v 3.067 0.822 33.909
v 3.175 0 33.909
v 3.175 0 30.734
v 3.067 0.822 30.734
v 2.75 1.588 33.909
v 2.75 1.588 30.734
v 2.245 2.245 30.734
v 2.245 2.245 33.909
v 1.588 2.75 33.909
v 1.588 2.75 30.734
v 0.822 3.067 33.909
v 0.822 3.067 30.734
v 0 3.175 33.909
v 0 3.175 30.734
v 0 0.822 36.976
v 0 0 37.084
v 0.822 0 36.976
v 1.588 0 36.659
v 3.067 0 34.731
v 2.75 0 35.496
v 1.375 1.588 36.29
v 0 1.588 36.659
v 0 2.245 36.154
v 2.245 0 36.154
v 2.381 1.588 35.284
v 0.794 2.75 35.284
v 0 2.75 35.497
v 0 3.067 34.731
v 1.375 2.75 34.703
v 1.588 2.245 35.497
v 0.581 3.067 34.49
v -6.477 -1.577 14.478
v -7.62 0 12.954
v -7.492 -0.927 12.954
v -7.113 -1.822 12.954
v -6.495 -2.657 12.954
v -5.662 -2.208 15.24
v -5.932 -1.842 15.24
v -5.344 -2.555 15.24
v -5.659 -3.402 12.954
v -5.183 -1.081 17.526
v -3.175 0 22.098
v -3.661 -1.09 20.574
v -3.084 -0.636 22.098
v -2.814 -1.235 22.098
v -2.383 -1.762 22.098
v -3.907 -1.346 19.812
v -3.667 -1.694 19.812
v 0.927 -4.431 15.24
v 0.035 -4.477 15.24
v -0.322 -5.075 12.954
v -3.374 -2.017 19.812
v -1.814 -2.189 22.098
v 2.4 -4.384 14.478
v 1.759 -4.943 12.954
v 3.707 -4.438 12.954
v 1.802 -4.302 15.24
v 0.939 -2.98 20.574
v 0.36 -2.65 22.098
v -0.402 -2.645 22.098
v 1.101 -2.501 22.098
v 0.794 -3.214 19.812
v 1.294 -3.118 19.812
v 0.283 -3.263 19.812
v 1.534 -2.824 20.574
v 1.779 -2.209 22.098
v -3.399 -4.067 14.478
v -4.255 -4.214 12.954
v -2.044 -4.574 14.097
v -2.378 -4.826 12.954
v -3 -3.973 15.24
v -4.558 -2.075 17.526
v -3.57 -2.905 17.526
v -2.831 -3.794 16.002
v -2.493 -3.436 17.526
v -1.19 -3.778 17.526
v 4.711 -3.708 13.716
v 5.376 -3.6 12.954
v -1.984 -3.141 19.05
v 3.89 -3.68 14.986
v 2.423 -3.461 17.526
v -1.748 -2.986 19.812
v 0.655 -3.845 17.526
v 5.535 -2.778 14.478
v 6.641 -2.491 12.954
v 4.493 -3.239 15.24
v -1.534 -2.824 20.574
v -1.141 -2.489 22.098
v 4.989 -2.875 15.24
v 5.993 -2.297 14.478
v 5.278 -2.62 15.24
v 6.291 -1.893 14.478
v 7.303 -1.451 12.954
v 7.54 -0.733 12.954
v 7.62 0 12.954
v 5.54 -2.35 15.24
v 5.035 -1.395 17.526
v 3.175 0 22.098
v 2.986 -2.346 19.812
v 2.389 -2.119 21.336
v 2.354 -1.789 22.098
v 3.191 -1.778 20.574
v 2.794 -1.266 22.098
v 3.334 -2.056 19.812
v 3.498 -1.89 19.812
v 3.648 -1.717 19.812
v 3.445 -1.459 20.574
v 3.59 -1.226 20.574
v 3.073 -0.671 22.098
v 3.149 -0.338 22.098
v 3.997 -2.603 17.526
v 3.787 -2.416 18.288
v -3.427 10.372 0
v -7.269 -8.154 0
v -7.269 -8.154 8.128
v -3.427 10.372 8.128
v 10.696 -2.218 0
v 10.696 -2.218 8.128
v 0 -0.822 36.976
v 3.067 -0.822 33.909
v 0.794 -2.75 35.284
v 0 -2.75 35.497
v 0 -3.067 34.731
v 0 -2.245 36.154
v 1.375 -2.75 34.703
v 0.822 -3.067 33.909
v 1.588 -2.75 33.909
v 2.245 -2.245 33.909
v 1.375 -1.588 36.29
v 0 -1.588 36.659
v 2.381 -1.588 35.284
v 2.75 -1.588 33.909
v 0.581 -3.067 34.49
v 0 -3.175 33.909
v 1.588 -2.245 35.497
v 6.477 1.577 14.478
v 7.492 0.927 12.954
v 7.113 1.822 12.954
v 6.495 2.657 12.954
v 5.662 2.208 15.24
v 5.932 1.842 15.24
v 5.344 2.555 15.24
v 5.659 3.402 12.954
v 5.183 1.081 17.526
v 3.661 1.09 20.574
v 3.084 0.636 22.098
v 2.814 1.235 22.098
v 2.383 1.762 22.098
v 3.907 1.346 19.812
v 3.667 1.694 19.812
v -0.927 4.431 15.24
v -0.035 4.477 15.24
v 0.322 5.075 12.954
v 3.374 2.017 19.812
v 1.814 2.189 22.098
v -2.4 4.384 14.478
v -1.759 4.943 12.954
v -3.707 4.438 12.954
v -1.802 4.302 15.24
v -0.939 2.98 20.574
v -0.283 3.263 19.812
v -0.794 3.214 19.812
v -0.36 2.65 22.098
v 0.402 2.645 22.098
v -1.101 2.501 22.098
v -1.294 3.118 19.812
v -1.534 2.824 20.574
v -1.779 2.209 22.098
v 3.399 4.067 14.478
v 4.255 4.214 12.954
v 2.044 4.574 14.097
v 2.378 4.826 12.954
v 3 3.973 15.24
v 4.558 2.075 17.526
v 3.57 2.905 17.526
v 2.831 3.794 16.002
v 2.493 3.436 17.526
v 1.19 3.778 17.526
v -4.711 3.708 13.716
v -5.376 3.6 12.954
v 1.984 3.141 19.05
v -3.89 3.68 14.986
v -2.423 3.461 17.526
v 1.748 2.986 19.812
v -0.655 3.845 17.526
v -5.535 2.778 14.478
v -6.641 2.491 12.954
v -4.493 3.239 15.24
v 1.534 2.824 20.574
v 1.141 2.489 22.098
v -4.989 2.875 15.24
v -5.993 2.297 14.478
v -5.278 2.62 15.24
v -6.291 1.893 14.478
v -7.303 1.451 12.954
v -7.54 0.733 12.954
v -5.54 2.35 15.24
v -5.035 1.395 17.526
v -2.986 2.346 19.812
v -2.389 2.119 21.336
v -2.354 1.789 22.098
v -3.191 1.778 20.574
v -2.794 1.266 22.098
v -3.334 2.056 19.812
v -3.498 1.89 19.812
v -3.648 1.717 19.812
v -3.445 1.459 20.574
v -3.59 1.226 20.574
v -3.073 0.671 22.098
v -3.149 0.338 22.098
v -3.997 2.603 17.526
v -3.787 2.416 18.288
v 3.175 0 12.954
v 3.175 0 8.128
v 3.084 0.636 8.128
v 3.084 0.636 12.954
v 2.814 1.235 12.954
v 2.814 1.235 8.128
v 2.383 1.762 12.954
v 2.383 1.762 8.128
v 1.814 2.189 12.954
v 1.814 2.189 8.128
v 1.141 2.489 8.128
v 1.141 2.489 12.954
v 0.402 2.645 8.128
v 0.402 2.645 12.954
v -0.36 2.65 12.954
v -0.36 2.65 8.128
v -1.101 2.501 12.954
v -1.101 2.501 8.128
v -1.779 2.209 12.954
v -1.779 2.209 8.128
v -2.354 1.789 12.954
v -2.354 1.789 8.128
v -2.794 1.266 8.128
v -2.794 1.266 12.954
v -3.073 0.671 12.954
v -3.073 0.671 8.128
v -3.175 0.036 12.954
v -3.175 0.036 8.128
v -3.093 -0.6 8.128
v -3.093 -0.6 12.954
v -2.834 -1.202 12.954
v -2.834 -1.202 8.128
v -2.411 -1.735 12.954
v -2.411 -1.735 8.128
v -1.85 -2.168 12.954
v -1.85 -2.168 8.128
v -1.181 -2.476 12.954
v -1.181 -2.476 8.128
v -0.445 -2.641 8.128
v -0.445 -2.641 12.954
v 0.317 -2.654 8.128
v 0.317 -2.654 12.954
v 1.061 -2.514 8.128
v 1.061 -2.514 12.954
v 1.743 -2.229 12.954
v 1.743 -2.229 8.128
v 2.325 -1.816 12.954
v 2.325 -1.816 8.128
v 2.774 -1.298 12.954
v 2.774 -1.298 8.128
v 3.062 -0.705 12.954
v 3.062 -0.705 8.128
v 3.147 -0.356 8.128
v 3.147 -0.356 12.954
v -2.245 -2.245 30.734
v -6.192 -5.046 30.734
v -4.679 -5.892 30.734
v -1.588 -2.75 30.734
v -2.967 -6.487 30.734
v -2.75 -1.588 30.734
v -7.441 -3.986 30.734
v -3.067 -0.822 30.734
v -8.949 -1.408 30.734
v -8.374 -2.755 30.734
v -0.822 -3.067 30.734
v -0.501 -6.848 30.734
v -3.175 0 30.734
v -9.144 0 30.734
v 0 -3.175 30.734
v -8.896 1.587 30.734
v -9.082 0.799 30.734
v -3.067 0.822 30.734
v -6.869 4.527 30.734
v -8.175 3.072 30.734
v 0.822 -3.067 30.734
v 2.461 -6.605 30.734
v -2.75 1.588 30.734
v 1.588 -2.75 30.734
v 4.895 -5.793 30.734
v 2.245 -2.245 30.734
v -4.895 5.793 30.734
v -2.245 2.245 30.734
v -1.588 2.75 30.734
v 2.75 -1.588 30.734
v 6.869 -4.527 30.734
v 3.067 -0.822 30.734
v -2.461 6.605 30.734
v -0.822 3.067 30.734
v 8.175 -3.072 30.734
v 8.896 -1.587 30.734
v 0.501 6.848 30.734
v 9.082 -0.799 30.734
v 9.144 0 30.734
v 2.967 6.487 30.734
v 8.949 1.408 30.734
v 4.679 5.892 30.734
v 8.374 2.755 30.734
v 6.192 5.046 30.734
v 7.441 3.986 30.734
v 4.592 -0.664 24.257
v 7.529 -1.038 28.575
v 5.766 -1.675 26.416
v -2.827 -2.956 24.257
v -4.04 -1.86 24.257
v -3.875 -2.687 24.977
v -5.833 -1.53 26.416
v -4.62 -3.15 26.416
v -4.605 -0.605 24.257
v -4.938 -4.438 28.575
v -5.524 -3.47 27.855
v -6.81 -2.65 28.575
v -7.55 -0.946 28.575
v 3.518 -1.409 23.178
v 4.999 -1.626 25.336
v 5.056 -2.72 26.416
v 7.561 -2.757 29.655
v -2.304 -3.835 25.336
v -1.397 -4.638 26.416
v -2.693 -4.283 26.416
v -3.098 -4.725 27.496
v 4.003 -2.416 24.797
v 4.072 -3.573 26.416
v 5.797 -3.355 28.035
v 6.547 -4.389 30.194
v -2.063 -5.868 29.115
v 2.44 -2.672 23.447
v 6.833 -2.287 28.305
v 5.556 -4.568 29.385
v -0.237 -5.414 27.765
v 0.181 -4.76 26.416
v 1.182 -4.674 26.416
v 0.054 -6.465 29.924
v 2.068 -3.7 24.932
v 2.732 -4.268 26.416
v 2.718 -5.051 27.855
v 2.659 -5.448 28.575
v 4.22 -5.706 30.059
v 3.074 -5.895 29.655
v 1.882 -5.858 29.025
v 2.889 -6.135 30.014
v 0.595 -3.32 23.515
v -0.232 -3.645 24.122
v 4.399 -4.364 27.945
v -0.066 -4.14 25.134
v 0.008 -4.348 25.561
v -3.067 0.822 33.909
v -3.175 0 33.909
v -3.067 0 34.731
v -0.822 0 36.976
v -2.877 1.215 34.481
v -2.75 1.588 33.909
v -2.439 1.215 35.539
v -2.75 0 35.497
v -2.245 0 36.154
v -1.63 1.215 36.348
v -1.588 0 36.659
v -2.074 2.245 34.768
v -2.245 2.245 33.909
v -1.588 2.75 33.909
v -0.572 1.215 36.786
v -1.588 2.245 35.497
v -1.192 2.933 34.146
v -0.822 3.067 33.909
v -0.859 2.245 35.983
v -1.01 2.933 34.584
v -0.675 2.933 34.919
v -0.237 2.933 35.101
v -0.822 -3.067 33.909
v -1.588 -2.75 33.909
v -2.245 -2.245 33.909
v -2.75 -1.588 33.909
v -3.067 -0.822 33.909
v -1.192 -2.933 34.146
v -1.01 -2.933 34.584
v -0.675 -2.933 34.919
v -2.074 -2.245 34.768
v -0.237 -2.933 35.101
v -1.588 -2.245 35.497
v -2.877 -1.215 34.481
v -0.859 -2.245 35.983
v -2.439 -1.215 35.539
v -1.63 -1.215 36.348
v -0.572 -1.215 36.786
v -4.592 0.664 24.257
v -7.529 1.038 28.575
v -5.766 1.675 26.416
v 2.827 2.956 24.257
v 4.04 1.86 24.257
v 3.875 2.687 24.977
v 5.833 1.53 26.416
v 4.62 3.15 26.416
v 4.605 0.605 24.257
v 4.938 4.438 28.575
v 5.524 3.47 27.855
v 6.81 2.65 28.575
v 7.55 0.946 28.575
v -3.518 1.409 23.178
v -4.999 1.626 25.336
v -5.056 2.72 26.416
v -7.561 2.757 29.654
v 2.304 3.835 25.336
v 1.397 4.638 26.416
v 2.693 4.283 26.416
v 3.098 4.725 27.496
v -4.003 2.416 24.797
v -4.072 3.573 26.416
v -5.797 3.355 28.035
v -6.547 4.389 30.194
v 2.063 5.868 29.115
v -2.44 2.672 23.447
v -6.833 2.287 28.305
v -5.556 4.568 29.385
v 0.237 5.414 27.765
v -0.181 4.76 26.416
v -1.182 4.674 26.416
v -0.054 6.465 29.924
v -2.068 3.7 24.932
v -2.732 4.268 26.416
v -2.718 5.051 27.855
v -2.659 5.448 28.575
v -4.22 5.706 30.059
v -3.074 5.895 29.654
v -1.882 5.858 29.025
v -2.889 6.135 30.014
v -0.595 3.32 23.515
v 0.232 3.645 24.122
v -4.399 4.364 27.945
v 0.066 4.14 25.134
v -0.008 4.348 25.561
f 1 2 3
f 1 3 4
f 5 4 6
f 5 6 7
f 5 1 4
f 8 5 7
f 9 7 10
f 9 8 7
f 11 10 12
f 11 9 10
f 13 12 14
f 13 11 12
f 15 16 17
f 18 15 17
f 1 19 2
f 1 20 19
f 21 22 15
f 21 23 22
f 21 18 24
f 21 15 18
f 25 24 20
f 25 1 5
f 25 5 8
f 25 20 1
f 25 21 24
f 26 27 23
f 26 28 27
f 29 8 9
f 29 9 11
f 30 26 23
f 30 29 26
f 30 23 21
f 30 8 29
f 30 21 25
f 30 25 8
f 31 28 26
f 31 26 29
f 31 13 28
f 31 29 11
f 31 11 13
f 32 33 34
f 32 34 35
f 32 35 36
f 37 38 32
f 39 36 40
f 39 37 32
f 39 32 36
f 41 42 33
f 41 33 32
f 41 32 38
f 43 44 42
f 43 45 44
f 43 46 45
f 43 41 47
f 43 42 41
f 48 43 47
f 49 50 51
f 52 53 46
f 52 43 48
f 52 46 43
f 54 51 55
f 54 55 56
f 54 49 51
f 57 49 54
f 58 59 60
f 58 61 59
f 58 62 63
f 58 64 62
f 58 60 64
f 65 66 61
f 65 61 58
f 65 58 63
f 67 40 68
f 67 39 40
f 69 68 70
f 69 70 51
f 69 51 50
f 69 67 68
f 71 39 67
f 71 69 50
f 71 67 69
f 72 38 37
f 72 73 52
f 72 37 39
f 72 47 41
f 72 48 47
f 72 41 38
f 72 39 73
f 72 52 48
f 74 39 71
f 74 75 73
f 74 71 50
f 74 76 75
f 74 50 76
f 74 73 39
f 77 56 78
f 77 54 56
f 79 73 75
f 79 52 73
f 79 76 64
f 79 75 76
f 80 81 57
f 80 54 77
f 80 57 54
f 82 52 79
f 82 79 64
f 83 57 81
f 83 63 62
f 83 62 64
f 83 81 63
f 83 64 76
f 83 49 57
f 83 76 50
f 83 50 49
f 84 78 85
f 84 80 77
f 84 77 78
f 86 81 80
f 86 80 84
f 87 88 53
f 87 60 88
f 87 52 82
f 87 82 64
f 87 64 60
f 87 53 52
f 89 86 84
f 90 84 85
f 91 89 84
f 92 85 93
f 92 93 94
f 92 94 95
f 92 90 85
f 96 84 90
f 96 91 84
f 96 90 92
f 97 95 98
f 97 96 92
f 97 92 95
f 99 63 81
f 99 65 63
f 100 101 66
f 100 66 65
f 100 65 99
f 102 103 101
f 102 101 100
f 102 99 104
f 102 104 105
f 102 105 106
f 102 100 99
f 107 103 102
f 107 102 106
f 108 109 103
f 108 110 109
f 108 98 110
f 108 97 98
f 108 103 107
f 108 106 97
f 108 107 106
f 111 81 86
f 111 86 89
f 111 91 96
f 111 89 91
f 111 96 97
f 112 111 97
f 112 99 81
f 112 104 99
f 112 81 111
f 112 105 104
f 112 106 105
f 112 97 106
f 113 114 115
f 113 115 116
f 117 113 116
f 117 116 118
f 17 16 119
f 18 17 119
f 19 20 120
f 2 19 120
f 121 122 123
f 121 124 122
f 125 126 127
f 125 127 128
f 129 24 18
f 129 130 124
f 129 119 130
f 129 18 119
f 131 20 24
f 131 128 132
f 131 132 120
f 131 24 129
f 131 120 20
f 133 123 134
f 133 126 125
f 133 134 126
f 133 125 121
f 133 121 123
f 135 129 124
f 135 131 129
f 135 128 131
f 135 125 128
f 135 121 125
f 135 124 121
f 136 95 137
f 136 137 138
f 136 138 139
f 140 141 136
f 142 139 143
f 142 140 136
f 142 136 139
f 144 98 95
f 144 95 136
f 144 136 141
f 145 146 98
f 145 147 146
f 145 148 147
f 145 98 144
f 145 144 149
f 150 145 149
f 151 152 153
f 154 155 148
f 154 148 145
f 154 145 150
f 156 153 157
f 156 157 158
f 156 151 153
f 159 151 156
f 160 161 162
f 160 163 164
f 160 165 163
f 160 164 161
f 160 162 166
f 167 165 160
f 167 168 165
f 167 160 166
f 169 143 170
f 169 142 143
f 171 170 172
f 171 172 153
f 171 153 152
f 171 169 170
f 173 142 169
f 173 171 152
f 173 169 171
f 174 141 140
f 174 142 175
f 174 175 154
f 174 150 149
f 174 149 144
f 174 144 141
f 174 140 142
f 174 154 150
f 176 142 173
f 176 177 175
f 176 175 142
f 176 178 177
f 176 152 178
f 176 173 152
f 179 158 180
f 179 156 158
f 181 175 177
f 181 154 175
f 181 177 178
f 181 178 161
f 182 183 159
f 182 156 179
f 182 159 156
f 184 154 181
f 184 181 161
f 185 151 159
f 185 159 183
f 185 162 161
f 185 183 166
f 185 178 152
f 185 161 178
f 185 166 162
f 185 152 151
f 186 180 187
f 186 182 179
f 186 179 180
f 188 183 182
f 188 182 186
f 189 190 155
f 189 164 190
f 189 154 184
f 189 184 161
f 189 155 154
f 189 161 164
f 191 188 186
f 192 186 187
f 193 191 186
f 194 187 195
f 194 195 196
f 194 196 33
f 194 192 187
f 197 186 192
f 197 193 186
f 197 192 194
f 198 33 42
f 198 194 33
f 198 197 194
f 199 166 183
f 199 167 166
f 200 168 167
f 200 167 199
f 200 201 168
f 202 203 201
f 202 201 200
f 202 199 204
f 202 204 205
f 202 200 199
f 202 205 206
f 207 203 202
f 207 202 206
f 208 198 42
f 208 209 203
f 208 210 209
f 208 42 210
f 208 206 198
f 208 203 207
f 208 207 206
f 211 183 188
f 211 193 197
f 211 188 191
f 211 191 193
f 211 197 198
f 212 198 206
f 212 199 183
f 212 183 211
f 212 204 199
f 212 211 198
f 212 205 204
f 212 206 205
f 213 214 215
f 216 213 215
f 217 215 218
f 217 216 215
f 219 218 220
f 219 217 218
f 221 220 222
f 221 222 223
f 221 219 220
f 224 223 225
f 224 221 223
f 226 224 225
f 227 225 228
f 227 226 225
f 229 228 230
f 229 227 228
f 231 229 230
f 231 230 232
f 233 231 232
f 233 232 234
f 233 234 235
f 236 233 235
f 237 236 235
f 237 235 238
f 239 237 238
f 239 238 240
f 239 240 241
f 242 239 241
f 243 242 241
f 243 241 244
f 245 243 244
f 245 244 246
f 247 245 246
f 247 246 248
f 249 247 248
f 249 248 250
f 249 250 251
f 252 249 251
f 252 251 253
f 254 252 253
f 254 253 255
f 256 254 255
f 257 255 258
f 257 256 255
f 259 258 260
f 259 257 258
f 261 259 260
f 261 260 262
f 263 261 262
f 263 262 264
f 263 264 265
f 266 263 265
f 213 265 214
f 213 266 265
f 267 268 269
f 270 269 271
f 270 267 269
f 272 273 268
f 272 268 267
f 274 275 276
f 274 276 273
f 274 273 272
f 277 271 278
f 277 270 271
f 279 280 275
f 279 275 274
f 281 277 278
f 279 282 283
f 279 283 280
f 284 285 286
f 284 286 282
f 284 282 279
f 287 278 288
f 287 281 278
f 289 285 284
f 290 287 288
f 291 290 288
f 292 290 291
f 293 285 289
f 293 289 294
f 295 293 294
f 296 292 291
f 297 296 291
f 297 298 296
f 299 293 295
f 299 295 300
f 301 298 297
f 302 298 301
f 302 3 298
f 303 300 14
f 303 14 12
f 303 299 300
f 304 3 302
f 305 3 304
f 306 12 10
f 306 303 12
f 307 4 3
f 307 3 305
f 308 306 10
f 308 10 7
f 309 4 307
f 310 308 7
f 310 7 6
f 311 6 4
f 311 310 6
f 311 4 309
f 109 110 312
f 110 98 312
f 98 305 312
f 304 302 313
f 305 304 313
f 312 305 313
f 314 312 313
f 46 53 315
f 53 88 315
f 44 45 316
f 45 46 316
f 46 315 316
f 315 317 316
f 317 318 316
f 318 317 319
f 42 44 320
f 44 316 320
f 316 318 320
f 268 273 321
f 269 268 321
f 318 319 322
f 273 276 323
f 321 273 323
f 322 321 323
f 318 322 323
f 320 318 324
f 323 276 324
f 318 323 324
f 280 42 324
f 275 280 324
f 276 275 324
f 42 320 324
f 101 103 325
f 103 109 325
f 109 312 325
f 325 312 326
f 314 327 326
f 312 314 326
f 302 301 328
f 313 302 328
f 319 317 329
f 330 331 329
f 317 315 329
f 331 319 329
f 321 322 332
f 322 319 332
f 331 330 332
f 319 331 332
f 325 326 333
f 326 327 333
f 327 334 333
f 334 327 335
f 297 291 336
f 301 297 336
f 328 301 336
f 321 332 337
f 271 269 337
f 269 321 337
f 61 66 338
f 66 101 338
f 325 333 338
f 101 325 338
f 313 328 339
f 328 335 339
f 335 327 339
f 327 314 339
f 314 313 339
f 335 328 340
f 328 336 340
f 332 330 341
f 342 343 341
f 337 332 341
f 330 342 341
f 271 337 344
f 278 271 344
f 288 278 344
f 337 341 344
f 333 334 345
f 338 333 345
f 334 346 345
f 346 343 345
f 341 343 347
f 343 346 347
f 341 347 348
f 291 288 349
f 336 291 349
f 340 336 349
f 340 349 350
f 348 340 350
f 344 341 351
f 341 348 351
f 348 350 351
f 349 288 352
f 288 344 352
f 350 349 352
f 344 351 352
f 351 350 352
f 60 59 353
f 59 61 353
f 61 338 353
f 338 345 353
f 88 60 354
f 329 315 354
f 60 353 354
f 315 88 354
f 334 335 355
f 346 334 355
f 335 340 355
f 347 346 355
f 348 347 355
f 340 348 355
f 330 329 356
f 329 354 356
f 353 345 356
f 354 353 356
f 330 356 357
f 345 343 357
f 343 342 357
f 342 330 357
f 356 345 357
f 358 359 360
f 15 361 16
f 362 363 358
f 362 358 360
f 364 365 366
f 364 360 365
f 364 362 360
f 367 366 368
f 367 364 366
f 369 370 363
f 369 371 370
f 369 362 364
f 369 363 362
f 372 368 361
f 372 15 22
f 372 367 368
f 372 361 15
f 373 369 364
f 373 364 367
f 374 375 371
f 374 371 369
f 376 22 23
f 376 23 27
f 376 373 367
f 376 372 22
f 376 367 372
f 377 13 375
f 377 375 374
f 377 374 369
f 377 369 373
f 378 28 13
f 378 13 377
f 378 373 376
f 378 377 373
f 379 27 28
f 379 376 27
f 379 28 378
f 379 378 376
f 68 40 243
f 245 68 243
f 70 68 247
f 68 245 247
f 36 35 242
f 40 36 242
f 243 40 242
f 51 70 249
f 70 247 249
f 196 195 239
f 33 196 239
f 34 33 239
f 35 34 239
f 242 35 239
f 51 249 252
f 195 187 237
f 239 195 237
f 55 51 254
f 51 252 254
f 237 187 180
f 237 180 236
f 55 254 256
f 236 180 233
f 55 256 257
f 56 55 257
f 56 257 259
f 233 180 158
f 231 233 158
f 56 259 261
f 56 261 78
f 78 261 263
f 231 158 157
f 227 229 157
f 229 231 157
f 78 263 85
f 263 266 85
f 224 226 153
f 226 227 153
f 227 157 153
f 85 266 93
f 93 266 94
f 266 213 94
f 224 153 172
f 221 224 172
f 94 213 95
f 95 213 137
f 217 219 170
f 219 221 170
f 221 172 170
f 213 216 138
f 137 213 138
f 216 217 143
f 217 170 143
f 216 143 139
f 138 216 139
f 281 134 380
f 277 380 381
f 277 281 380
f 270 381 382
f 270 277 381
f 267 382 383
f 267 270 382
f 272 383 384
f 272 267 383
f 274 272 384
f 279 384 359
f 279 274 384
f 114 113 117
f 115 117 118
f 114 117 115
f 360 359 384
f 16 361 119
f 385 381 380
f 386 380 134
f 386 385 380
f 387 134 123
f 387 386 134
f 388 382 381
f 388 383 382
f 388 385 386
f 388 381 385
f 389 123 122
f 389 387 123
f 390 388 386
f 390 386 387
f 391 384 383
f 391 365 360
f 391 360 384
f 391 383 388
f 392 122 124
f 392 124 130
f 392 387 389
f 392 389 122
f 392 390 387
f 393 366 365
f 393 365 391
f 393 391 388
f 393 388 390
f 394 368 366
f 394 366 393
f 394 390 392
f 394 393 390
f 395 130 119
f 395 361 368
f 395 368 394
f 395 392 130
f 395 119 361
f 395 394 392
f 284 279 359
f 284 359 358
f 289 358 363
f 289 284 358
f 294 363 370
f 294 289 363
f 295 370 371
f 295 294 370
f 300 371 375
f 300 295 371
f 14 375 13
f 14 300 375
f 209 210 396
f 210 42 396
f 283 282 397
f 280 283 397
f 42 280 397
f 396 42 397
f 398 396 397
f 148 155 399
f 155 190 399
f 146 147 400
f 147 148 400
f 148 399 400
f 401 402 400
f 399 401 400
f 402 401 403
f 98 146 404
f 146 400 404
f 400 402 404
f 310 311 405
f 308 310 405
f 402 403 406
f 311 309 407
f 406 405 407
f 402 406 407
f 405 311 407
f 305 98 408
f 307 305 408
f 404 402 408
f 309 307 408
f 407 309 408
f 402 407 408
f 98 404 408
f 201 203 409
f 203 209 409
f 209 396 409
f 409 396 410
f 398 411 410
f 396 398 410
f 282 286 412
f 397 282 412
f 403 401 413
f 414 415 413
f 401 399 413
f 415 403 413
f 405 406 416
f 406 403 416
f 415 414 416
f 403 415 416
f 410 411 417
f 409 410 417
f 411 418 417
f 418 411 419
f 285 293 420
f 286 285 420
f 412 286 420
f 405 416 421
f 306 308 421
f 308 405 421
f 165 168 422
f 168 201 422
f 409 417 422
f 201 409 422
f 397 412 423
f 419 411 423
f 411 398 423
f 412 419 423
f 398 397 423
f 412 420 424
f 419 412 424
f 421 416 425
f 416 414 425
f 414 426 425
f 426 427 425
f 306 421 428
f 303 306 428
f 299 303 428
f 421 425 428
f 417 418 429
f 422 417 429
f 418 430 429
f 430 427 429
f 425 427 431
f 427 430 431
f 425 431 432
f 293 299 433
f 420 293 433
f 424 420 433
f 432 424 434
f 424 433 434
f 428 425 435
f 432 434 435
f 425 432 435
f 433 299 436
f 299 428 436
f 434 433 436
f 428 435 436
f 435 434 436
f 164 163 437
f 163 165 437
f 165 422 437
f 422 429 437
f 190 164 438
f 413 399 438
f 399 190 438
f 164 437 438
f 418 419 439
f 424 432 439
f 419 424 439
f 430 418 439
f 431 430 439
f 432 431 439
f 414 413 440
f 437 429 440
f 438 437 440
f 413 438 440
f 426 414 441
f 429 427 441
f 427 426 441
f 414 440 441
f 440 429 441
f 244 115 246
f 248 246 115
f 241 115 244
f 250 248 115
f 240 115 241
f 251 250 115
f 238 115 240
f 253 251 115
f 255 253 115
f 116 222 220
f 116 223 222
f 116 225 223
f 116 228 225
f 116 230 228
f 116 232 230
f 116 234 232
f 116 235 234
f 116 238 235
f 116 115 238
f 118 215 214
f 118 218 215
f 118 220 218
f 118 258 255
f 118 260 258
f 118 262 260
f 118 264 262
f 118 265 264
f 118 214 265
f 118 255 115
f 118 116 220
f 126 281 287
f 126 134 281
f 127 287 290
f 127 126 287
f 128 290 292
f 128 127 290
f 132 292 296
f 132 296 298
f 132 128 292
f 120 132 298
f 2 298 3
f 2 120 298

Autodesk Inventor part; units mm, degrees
ref_plane "YZ Plane" through (0, 0, 0) normal (1, 0, 0) x (0, 1, 0)
ref_plane "XZ Plane" through (0, 0, 0) normal (0, 1, 0) x (-1, 0, 0)
ref_plane "XY Plane" through (0, 0, 0) normal (0, 0, 1) x (1, 0, 0)
sketch "Sketch1" plane through (0, 0, 0) normal (0, 0, 1) x (1, 0, 0)
  line L0 (-3.4267, 10.372) -> (10.6957, -2.2184)
  line L1 (10.6957, -2.2184) -> (-7.2691, -8.1536)
  line L2 (-7.2691, -8.1536) -> (-3.4267, 10.372)
  ellipse E0 centre (0, 0) end of major axis (3.175, 0) minor radius 2.667
  dimension "d1" = 3.175
  dimension "d2" = 2.667
  dimension "d0" = 14.1224
extrude "Extrusion1" add sketch "Sketch1" along normal blind 8.128 contours L0 L1 L2 | E0
ref_plane "Work Plane2" through (0, 0, 12.954) normal (0, 0, 1) x (1, 0, 0)
sketch "Sketch2" plane through (0, 0, 12.954) normal (0, 0, 1) x (1, 0, 0)
  point P0 (0, 0)
sketch "Sketch3" plane through (0, 0, 12.954) normal (0, 0, 1) x (1, 0, 0)
  point P0 (0, 0)
sketch "Sketch4" plane through (0, 0, 12.954) normal (0, 0, 1) x (1, 0, 0)
  ellipse E0 centre (0, 0) end of major axis (3.175, 0) minor radius 2.667
  dimension "d6" = 3.175
  dimension "d7" = 2.667
sketch "Sketch5" plane through (0, 0, 12.954) normal (0, 0, 1) x (1, 0, 0)
  line L0 (10.6957, -2.2184) -> (-3.4267, 10.372) projected
  line L1 (-3.4267, 10.372) -> (-7.2691, -8.1536) projected
  line L2 (-7.2691, -8.1536) -> (10.6957, -2.2184) projected
sketch "Sketch6" plane through (0, 0, 8.128) normal (0, 0, 1) x (1, 0, 0)
  ellipse E0 centre (0, 0) end of major axis (3.175, 0) minor radius 2.667 projected
  ellipse E1 centre (0, 0) end of major axis (3.175, 0) minor radius 2.667
loft "Loft1" add profiles "Sketch6", "Sketch4"
ref_plane "Work Plane4" through (0, 0, 30.734) normal (0, 0, 1) x (1, 0, 0)
ref_plane "Work Plane3" through (0, 0, 22.098) normal (0, 0, 1) x (1, 0, 0)
sketch "Sketch7" plane through (0, 0, 22.098) normal (0, 0, 1) x (1, 0, 0)
  ellipse E0 centre (0, 0) end of major axis (-3.175, 0) minor radius 2.667 projected
sketch "Sketch8" plane through (0, 0, 22.098) normal (0, 0, 1) x (1, 0, 0)
  ellipse E0 centre (0, 0) end of major axis (3.175, 0) minor radius 2.667
  ellipse E1 centre (0, 0) end of major axis (-3.175, 0) minor radius 2.667 projected
sketch "Sketch9" plane through (0, 0, 12.954) normal (0, 0, 1) x (1, 0, 0)
  ellipse E0 centre (0, 0) end of major axis (7.62, 0) minor radius 5.08
  dimension "d16" = 7.62
  dimension "d17" = 5.08
loft "Loft2" add profiles "Sketch9", "Sketch7"
sketch "Sketch10" plane through (0, 0, 30.734) normal (0, 0, 1) x (1, 0, 0)
  ellipse E0 centre (0, 0) end of major axis (9.144, 0) minor radius 6.858
  dimension "d22" = 6.858
  dimension "d23" = 9.144
loft "Loft3" add profiles "Sketch10" section 1 edges at (0, 2.667, 22.098) (0, -2.667, 22.098)
sketch "Sketch11" plane through (0, 0, 30.734) normal (0, 0, 1) x (1, 0, 0)
  line L0 (-3.175, 3.175) -> (3.175, 3.175)
  line L1 (3.175, 3.175) -> (3.175, -3.175)
  line L2 (3.175, -3.175) -> (-3.175, -3.175)
  line L3 (-3.175, -3.175) -> (-3.175, 3.175)
  point P0 (0, 0)
  dimension "d28" = 6.35
  dimension "d29" = 6.35
  dimension "d30" = 3.175
  dimension "d31" = 3.175
extrude "Extrusion2" add sketch "Sketch11" along normal blind 6.35
fillet "Fillet1" radius 3.175 1 edges at (3.175, 0, 37.084)
fillet "Fillet2" radius 3.175 1 edges at (-3.175, 0, 37.084)
fillet "Fillet3" radius 3.175 3 edges at (3.175, 3.175, 32.3215) (2.2451, 3.175, 36.1541) (-3.175, 3.175, 32.3215)
fillet "Fillet4" radius 3.175 3 edges at (3.175, -3.175, 32.3215) (2.2451, -3.175, 36.1541) (-3.175, -3.175, 32.3215)
properties part number "girlNT"
